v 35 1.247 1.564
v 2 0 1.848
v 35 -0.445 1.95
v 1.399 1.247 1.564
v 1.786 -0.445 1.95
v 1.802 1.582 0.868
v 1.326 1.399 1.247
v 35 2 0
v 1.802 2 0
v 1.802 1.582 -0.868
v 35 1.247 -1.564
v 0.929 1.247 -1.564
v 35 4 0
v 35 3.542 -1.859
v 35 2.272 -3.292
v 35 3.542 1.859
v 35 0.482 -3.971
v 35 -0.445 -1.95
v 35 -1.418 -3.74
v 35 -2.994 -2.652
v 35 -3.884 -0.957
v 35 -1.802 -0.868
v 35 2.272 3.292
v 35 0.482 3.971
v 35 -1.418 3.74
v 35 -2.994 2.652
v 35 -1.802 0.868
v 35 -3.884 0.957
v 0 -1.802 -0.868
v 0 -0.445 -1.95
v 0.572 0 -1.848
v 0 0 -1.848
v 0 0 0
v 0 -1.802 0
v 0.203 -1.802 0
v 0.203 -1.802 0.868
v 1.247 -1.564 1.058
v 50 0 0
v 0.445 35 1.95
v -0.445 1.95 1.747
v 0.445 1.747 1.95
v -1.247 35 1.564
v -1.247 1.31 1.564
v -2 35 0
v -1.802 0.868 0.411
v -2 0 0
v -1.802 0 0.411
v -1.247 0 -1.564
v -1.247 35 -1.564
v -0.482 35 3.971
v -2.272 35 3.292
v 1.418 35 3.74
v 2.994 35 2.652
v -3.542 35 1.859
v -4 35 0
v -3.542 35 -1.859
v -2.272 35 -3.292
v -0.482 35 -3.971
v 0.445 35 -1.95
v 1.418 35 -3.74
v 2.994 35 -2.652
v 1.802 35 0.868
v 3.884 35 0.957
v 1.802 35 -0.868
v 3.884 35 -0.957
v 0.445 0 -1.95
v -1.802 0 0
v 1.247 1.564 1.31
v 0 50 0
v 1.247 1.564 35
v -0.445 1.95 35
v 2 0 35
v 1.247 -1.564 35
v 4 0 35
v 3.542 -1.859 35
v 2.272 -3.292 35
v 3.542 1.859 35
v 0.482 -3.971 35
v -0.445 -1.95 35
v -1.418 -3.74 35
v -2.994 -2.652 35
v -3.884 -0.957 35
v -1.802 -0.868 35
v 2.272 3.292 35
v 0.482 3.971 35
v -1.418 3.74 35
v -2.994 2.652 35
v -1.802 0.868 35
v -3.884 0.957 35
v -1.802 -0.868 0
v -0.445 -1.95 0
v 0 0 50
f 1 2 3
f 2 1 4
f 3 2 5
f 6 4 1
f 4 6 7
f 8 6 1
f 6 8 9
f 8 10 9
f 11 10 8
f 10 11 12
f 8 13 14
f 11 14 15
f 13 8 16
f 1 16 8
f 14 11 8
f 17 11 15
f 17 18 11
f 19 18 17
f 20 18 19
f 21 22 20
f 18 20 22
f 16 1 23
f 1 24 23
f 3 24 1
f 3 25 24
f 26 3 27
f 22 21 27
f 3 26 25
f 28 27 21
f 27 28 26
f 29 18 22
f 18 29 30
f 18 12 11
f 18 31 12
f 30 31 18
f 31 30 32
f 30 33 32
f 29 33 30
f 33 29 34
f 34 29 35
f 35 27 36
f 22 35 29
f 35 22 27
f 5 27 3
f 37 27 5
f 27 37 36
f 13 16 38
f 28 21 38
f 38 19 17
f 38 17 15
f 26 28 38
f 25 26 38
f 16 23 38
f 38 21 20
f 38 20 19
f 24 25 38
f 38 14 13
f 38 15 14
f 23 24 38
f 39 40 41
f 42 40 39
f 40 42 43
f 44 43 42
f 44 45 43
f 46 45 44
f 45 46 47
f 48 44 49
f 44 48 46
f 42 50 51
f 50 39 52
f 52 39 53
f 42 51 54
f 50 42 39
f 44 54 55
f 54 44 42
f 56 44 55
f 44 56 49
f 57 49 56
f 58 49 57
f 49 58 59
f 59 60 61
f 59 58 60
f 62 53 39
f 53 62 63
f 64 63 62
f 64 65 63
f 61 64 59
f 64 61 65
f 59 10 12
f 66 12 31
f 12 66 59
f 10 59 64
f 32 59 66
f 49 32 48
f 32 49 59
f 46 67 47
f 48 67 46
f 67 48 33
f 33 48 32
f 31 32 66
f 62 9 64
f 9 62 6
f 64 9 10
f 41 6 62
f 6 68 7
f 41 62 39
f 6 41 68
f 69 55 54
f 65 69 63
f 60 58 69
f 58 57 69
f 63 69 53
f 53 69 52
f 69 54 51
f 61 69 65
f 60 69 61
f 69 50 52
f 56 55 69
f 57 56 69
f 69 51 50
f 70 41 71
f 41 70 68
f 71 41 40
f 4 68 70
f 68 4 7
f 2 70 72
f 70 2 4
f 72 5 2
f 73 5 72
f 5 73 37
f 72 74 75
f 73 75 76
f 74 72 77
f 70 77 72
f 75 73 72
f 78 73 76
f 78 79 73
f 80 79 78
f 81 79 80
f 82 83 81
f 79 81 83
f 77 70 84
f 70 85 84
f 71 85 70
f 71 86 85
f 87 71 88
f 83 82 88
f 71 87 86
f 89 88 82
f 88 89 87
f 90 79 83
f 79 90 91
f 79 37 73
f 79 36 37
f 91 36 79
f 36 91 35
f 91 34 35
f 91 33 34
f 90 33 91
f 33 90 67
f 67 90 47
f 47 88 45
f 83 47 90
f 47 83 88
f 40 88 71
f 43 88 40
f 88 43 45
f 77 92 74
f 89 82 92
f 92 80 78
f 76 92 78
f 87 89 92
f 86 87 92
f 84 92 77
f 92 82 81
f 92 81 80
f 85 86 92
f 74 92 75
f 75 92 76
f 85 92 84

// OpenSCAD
// Module axis_arrows renders three arrows showing
// the X, Y and Z axes.
//

//// Global resolution
//// Don't generate smaller facets than this many mm.
//$fs = 0.5;
//// Don't generate larger angles than this many degrees.
//$fa = 1;

color("green") axis_arrows();

// Draws an arrow from the origin along the Z axis.
module arrow(total_length=50, shaft_radius=2,
             head_length=15, head_radius=4, message="") {
  shaft_length = total_length-head_length;
  cylinder(h=shaft_length, r=shaft_radius);
  translate([0,0,shaft_length])
    cylinder(h=head_length, r1=head_radius, r2=0);
  if (message != "") {
    echo("message is set");
    translate([0,0,total_length])
      text(message, halign="center", valign="center");
  } else {
    echo("no message");
  }
}

module axis_arrows(total_length=50, shaft_radius=2,
                   head_length=15, head_radius=4) {
  rotate([0,90,0])
    rotate([0,0,90])
      arrow(message="X",
            total_length=total_length,
            shaft_radius=shaft_radius,
            head_length=head_length,
            head_radius=head_radius);
  rotate([-90,180,0])
    arrow(message="Y",
          total_length=total_length,
          shaft_radius=shaft_radius,
          head_length=head_length,
          head_radius=head_radius);
  arrow(message="Z",
        total_length=total_length,
        shaft_radius=shaft_radius,
        head_length=head_length,
        head_radius=head_radius);
}
